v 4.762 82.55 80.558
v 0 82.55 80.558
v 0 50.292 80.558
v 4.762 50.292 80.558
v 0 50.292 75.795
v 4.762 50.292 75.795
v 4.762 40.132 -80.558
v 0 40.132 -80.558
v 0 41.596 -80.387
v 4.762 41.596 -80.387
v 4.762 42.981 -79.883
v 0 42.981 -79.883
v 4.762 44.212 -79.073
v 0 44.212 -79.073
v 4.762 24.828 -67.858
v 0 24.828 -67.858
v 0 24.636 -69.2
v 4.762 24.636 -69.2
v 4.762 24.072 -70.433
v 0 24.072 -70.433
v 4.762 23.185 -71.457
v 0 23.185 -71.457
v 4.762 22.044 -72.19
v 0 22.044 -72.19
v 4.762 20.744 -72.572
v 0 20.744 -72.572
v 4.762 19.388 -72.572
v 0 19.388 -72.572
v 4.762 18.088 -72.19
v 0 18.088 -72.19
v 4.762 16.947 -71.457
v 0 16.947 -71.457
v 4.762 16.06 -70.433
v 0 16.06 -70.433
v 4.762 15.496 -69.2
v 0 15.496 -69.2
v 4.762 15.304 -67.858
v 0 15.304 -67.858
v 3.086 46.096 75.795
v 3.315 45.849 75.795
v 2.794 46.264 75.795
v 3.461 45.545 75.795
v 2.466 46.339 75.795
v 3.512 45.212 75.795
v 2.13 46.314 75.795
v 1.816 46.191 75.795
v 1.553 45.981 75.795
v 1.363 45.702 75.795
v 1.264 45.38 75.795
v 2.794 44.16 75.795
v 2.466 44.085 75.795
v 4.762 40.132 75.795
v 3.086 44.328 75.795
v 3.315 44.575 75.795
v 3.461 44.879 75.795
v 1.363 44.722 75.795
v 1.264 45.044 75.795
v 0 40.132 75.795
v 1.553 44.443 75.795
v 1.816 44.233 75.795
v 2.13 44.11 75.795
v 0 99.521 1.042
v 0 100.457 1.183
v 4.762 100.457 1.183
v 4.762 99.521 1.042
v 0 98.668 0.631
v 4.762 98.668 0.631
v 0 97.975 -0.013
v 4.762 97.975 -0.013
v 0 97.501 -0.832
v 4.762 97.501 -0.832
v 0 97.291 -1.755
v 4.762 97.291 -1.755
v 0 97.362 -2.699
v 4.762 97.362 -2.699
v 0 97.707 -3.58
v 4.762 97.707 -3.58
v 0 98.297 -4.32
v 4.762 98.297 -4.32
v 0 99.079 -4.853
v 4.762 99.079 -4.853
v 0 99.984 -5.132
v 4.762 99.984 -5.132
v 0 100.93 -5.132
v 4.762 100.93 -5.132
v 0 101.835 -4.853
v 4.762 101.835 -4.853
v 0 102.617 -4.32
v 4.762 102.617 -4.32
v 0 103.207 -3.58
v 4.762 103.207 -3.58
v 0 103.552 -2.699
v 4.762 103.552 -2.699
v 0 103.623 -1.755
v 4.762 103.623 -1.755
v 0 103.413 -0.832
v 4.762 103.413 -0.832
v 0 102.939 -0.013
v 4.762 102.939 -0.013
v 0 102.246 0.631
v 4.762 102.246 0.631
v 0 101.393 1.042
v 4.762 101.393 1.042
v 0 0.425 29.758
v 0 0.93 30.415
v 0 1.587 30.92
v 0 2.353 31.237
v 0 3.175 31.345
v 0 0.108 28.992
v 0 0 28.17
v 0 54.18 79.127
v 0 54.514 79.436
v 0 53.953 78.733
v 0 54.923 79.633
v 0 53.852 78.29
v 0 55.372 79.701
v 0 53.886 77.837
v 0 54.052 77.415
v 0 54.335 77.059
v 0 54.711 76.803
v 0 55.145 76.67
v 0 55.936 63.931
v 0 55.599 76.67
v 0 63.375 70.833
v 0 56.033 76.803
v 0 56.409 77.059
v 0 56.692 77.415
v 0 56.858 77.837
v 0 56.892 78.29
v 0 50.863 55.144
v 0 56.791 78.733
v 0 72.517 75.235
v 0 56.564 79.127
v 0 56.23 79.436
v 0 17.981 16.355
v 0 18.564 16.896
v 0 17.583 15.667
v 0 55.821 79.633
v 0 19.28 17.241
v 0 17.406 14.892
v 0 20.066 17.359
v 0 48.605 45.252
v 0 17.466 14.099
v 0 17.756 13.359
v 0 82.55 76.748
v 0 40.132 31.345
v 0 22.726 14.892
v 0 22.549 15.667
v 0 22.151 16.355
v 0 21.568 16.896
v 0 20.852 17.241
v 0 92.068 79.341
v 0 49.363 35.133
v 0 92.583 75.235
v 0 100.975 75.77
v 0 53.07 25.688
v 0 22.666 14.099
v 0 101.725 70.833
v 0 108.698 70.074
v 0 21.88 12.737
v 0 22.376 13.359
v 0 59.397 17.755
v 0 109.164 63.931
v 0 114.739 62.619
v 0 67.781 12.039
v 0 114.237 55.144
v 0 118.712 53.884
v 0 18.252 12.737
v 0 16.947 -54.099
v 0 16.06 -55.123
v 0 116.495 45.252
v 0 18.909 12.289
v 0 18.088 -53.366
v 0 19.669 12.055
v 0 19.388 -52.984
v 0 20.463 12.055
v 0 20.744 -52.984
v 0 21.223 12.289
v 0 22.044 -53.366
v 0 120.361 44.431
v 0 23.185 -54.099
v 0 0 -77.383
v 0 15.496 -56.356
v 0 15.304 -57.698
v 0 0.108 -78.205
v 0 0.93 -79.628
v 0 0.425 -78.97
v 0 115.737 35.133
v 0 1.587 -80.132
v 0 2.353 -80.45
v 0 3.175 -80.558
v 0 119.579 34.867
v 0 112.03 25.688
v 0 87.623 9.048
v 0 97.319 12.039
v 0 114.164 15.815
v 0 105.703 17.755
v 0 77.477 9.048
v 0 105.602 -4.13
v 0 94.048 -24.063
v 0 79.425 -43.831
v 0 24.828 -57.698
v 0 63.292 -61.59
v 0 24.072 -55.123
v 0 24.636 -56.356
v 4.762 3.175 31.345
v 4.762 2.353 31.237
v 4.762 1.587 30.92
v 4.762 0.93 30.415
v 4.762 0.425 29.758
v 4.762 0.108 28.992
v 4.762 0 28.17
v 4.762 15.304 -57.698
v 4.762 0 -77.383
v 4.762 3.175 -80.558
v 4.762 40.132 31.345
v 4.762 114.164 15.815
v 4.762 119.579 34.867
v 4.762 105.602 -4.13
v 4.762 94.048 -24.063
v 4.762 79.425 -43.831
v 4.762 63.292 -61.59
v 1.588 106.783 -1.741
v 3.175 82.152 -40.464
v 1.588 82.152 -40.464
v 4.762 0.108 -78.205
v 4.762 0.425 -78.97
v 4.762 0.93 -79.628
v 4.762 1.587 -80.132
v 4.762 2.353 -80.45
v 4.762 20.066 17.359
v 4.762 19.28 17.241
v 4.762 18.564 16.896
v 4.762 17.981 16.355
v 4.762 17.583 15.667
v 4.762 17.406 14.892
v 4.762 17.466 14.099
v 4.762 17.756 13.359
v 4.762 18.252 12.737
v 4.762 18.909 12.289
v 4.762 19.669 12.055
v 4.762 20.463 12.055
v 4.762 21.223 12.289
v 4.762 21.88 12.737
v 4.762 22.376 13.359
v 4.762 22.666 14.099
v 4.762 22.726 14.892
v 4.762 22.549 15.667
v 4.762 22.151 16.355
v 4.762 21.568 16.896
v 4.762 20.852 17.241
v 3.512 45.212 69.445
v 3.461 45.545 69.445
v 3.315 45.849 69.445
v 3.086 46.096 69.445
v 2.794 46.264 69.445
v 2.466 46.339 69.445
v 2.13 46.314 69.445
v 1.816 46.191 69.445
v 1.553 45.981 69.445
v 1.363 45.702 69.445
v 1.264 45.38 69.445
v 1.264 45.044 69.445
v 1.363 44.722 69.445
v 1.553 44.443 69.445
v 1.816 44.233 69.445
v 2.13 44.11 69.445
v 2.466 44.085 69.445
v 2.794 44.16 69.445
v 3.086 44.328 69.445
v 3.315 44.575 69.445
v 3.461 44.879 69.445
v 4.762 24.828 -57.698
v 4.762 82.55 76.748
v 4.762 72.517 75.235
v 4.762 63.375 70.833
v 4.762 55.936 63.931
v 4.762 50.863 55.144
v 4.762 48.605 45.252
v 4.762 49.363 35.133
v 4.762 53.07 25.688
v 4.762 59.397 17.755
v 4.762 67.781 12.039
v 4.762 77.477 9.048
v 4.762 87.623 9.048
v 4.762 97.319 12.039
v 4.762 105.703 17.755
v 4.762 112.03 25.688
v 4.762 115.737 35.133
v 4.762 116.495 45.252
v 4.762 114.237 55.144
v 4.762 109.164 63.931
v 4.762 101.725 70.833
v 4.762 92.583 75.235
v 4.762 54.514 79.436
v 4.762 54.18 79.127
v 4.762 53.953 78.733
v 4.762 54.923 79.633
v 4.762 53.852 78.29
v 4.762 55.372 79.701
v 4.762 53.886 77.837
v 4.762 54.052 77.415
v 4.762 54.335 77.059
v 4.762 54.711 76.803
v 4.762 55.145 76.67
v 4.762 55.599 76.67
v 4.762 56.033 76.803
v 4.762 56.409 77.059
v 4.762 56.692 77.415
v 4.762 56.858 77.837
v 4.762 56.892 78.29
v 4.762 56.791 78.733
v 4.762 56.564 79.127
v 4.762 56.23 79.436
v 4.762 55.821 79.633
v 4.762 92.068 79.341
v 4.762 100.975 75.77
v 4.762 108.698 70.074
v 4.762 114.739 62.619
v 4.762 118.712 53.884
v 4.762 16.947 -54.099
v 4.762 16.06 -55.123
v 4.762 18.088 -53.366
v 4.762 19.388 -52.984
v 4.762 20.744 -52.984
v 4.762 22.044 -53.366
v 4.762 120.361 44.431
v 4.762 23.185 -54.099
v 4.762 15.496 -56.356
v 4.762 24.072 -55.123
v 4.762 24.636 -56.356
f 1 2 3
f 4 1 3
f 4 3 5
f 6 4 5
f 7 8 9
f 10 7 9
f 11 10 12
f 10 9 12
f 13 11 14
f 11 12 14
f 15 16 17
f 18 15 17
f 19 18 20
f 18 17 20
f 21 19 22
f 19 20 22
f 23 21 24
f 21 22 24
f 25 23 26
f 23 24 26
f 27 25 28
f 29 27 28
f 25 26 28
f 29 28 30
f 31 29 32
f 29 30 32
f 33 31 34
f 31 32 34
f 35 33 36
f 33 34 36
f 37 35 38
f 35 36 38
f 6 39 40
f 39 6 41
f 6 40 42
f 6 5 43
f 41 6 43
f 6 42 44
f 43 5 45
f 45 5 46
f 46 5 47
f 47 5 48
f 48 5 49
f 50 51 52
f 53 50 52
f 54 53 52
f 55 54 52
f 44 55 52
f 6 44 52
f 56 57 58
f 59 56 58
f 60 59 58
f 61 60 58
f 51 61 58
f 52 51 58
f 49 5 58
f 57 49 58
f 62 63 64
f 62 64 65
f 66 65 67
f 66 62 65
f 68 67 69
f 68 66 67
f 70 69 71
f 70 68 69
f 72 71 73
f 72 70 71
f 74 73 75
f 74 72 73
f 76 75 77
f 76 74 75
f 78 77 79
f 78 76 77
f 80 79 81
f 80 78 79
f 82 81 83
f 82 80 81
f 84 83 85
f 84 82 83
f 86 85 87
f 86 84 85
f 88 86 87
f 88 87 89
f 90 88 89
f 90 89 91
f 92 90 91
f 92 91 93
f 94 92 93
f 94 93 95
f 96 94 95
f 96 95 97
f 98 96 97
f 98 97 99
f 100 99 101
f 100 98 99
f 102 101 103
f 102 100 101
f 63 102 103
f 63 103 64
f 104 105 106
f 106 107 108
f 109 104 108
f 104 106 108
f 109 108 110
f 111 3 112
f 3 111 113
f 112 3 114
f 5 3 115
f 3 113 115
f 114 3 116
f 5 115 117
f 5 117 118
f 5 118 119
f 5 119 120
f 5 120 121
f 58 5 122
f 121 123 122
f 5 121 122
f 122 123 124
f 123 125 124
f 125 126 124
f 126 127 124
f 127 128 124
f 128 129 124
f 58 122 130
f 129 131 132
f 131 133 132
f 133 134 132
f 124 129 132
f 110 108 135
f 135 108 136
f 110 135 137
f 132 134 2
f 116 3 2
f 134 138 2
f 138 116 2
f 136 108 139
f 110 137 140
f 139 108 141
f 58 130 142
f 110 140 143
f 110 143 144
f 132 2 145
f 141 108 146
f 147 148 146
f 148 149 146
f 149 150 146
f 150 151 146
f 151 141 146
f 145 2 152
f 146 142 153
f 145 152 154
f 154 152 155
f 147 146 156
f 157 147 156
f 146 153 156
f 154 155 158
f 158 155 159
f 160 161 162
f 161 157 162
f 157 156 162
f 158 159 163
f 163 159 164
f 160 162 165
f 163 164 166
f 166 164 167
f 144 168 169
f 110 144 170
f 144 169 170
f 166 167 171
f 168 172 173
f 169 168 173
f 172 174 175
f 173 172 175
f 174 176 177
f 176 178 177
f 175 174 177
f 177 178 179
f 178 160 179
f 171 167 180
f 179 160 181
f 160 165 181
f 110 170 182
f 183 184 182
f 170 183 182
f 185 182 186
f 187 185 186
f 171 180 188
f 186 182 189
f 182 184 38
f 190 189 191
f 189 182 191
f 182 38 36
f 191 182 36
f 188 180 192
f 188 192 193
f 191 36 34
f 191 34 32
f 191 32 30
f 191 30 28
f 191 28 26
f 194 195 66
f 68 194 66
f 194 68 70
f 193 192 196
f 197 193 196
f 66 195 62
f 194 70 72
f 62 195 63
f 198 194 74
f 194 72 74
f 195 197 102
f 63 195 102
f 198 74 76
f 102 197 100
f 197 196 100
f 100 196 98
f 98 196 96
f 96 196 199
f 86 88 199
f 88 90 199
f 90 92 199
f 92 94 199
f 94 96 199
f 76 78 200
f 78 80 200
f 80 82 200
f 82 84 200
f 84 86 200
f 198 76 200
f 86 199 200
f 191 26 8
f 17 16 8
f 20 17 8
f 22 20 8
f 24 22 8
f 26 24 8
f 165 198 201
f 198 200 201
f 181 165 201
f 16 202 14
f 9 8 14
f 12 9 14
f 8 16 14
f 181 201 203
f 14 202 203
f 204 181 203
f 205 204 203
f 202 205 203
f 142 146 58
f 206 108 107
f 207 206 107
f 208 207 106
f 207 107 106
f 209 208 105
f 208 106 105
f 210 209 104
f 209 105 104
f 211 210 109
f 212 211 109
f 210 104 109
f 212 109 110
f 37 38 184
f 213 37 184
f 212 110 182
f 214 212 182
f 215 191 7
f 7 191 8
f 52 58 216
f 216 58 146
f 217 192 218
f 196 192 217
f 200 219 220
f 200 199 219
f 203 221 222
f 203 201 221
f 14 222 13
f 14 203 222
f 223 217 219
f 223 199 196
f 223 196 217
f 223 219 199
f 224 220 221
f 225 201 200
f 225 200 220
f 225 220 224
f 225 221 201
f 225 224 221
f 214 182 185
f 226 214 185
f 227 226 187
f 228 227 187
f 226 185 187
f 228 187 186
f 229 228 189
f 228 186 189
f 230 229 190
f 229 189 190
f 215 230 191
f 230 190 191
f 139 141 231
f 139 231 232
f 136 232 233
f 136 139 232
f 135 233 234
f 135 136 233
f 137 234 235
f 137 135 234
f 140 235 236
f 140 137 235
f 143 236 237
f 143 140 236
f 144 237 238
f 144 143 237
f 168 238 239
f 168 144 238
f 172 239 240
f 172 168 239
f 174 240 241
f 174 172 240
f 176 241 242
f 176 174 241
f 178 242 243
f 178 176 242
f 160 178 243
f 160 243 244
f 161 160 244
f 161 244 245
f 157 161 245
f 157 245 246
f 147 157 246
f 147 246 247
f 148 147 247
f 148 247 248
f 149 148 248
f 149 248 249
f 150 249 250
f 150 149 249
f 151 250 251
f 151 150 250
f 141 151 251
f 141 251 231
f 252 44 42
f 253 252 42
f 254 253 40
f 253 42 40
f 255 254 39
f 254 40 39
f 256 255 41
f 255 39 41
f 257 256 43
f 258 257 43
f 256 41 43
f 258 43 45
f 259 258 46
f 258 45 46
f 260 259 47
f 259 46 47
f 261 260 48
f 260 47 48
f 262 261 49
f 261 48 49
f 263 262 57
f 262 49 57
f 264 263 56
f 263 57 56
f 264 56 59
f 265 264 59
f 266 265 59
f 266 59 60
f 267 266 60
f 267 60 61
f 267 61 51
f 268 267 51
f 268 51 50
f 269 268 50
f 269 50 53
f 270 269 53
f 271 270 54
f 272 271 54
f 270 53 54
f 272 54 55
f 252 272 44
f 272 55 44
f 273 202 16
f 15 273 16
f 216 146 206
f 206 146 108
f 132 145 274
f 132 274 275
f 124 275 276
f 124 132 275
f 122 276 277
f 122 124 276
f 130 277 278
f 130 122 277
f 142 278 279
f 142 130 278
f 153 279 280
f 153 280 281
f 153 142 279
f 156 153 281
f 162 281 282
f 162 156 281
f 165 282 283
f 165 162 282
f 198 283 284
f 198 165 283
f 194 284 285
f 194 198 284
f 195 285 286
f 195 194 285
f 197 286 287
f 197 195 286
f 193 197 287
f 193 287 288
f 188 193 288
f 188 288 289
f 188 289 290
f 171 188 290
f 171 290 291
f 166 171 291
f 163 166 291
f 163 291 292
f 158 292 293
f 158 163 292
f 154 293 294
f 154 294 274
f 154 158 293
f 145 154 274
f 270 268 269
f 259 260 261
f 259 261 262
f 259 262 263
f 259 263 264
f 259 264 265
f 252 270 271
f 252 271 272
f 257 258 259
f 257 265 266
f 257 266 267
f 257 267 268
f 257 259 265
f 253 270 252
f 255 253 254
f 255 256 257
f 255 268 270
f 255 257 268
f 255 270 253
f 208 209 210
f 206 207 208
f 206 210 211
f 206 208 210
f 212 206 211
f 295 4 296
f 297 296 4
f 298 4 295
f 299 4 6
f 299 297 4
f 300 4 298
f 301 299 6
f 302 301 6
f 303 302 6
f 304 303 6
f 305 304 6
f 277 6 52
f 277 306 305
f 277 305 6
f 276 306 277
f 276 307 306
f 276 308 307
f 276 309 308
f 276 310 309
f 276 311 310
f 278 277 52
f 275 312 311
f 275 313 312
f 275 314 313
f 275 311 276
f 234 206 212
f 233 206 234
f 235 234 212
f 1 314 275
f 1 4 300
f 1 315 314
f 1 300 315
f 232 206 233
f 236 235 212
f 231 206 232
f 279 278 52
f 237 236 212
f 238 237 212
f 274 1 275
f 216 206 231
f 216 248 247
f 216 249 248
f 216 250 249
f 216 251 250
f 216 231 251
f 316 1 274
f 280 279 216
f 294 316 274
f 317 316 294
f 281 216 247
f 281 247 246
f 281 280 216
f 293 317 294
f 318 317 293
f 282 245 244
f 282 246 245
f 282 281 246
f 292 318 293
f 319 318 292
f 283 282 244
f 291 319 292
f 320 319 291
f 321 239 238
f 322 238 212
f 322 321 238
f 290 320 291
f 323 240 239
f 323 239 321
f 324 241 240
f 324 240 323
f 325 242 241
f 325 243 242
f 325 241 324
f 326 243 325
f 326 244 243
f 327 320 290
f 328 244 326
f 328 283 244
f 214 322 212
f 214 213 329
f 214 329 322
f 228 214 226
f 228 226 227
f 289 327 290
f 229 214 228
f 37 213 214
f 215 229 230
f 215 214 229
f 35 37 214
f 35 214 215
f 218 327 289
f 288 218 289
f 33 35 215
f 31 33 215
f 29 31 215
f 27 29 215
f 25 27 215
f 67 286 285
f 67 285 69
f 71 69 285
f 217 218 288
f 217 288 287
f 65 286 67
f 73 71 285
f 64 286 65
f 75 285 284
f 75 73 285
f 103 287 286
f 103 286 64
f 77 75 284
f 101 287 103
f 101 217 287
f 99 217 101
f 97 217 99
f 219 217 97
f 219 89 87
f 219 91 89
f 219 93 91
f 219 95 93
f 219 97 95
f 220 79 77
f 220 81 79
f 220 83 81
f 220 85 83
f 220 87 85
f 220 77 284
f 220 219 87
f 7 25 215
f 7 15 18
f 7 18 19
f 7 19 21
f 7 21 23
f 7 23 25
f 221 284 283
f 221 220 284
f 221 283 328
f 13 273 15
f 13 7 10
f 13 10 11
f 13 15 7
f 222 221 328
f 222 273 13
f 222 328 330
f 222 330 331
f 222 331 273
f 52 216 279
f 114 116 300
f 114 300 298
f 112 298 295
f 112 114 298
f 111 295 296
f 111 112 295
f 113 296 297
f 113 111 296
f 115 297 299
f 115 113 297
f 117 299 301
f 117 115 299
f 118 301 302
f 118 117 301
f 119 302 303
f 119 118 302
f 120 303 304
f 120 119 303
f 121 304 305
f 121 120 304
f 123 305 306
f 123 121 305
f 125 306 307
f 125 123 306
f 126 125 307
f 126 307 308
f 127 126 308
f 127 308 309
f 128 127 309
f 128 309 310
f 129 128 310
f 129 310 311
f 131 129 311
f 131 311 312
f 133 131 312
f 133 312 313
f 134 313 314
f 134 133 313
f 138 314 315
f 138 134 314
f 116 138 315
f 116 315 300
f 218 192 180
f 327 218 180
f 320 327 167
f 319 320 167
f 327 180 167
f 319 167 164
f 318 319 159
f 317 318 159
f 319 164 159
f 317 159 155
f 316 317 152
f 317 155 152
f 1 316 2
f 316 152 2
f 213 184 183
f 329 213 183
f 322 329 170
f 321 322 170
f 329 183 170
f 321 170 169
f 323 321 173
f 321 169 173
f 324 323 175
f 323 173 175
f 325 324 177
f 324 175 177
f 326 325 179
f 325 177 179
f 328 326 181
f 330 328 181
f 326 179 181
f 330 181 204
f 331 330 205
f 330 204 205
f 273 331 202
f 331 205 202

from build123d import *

# Parameters (mm, degrees)
SKETCH1_R           = 1.524
SKETCH1_R_2         = 3.175
SKETCH1_R_3         = 2.667
SKETCH1_R_4         = 34.04
BOSS_EXTRUDE1_DEPTH = 4.7625
SKETCH2_R           = 1.1303
CUT_EXTRUDE1_DEPTH  = 6.35


with BuildPart() as part:
    # Sketch1 → Boss-Extrude1 (new body)
    with BuildSketch(Plane(origin=(0, 0, 0), x_dir=(0, 0, -1), z_dir=(1, 0, 0))):
        with BuildLine():
            Line((-28.170295117, 0), (77.382795117, 0))
            ThreePointArc((77.382795117, 0), (79.627859148, 0.92993597), (80.557795117, 3.175))
            Line((80.557795117, 3.175), (80.557795117, 40.132))
            ThreePointArc((80.557795117, 40.132), (80.175158576, 42.302961389), (79.073362565, 44.212288398))
            add(Edge.make_bspline(
                [(-34.867281509, 119.579027078), (-0.058341562, 112.208593965), (41.263784204, 89.298575374), (79.073362565, 44.212288398)],
                knots=[0, 0, 0, 0, 1, 1, 1, 1], degree=3))
            ThreePointArc((-34.867281509, 119.579027078), (-66.539067219, 111.95566221), (-80.557795117, 82.55))
            Line((-80.557795117, 82.55), (-80.557795117, 50.292))
            Line((-80.557795117, 50.292), (-75.795295117, 50.292))
            Line((-75.795295117, 50.292), (-75.795295117, 40.132))
            Line((-75.795295117, 40.132), (-31.345295117, 40.132))
            Line((-31.345295117, 40.132), (-31.345295117, 3.175))
            ThreePointArc((-31.345295117, 3.175), (-30.415359148, 0.92993597), (-28.170295117, 0))
        make_face()
        with Locations(Location((-78.176545117, 55.372, 0), (0, 0, 180))):
            Circle(SKETCH1_R, mode=Mode.SUBTRACT)
        with Locations(Location((1.992204883, 100.457, 0), (0, 0, 180))):
            Circle(SKETCH1_R_2, mode=Mode.SUBTRACT)
        with Locations(Location((-14.692204883, 20.066, 0), (0, 0, 180))):
            Circle(SKETCH1_R_3, mode=Mode.SUBTRACT)
        with Locations(Location((-42.707795117, 82.55, 0), (0, 0, 180))):
            Circle(SKETCH1_R_4, mode=Mode.SUBTRACT)
        with BuildLine():
            Line((67.857795117, 15.3035), (57.697795117, 15.3035))
            ThreePointArc((57.697795117, 15.3035), (52.935295117, 20.066), (57.697795117, 24.8285))
            Line((57.697795117, 24.8285), (67.857795117, 24.8285))
            ThreePointArc((67.857795117, 24.8285), (72.620295117, 20.066), (67.857795117, 15.3035))
        make_face(mode=Mode.SUBTRACT)
    extrude(amount=BOSS_EXTRUDE1_DEPTH)

    # Sketch2 → Cut-Extrude1 (cut)
    with BuildSketch(Plane.XY.offset(75.795295117)):
        with Locations((2.38125, 45.212)):
            Circle(SKETCH2_R)
    extrude(amount=-CUT_EXTRUDE1_DEPTH, mode=Mode.SUBTRACT)


solid = part.part
